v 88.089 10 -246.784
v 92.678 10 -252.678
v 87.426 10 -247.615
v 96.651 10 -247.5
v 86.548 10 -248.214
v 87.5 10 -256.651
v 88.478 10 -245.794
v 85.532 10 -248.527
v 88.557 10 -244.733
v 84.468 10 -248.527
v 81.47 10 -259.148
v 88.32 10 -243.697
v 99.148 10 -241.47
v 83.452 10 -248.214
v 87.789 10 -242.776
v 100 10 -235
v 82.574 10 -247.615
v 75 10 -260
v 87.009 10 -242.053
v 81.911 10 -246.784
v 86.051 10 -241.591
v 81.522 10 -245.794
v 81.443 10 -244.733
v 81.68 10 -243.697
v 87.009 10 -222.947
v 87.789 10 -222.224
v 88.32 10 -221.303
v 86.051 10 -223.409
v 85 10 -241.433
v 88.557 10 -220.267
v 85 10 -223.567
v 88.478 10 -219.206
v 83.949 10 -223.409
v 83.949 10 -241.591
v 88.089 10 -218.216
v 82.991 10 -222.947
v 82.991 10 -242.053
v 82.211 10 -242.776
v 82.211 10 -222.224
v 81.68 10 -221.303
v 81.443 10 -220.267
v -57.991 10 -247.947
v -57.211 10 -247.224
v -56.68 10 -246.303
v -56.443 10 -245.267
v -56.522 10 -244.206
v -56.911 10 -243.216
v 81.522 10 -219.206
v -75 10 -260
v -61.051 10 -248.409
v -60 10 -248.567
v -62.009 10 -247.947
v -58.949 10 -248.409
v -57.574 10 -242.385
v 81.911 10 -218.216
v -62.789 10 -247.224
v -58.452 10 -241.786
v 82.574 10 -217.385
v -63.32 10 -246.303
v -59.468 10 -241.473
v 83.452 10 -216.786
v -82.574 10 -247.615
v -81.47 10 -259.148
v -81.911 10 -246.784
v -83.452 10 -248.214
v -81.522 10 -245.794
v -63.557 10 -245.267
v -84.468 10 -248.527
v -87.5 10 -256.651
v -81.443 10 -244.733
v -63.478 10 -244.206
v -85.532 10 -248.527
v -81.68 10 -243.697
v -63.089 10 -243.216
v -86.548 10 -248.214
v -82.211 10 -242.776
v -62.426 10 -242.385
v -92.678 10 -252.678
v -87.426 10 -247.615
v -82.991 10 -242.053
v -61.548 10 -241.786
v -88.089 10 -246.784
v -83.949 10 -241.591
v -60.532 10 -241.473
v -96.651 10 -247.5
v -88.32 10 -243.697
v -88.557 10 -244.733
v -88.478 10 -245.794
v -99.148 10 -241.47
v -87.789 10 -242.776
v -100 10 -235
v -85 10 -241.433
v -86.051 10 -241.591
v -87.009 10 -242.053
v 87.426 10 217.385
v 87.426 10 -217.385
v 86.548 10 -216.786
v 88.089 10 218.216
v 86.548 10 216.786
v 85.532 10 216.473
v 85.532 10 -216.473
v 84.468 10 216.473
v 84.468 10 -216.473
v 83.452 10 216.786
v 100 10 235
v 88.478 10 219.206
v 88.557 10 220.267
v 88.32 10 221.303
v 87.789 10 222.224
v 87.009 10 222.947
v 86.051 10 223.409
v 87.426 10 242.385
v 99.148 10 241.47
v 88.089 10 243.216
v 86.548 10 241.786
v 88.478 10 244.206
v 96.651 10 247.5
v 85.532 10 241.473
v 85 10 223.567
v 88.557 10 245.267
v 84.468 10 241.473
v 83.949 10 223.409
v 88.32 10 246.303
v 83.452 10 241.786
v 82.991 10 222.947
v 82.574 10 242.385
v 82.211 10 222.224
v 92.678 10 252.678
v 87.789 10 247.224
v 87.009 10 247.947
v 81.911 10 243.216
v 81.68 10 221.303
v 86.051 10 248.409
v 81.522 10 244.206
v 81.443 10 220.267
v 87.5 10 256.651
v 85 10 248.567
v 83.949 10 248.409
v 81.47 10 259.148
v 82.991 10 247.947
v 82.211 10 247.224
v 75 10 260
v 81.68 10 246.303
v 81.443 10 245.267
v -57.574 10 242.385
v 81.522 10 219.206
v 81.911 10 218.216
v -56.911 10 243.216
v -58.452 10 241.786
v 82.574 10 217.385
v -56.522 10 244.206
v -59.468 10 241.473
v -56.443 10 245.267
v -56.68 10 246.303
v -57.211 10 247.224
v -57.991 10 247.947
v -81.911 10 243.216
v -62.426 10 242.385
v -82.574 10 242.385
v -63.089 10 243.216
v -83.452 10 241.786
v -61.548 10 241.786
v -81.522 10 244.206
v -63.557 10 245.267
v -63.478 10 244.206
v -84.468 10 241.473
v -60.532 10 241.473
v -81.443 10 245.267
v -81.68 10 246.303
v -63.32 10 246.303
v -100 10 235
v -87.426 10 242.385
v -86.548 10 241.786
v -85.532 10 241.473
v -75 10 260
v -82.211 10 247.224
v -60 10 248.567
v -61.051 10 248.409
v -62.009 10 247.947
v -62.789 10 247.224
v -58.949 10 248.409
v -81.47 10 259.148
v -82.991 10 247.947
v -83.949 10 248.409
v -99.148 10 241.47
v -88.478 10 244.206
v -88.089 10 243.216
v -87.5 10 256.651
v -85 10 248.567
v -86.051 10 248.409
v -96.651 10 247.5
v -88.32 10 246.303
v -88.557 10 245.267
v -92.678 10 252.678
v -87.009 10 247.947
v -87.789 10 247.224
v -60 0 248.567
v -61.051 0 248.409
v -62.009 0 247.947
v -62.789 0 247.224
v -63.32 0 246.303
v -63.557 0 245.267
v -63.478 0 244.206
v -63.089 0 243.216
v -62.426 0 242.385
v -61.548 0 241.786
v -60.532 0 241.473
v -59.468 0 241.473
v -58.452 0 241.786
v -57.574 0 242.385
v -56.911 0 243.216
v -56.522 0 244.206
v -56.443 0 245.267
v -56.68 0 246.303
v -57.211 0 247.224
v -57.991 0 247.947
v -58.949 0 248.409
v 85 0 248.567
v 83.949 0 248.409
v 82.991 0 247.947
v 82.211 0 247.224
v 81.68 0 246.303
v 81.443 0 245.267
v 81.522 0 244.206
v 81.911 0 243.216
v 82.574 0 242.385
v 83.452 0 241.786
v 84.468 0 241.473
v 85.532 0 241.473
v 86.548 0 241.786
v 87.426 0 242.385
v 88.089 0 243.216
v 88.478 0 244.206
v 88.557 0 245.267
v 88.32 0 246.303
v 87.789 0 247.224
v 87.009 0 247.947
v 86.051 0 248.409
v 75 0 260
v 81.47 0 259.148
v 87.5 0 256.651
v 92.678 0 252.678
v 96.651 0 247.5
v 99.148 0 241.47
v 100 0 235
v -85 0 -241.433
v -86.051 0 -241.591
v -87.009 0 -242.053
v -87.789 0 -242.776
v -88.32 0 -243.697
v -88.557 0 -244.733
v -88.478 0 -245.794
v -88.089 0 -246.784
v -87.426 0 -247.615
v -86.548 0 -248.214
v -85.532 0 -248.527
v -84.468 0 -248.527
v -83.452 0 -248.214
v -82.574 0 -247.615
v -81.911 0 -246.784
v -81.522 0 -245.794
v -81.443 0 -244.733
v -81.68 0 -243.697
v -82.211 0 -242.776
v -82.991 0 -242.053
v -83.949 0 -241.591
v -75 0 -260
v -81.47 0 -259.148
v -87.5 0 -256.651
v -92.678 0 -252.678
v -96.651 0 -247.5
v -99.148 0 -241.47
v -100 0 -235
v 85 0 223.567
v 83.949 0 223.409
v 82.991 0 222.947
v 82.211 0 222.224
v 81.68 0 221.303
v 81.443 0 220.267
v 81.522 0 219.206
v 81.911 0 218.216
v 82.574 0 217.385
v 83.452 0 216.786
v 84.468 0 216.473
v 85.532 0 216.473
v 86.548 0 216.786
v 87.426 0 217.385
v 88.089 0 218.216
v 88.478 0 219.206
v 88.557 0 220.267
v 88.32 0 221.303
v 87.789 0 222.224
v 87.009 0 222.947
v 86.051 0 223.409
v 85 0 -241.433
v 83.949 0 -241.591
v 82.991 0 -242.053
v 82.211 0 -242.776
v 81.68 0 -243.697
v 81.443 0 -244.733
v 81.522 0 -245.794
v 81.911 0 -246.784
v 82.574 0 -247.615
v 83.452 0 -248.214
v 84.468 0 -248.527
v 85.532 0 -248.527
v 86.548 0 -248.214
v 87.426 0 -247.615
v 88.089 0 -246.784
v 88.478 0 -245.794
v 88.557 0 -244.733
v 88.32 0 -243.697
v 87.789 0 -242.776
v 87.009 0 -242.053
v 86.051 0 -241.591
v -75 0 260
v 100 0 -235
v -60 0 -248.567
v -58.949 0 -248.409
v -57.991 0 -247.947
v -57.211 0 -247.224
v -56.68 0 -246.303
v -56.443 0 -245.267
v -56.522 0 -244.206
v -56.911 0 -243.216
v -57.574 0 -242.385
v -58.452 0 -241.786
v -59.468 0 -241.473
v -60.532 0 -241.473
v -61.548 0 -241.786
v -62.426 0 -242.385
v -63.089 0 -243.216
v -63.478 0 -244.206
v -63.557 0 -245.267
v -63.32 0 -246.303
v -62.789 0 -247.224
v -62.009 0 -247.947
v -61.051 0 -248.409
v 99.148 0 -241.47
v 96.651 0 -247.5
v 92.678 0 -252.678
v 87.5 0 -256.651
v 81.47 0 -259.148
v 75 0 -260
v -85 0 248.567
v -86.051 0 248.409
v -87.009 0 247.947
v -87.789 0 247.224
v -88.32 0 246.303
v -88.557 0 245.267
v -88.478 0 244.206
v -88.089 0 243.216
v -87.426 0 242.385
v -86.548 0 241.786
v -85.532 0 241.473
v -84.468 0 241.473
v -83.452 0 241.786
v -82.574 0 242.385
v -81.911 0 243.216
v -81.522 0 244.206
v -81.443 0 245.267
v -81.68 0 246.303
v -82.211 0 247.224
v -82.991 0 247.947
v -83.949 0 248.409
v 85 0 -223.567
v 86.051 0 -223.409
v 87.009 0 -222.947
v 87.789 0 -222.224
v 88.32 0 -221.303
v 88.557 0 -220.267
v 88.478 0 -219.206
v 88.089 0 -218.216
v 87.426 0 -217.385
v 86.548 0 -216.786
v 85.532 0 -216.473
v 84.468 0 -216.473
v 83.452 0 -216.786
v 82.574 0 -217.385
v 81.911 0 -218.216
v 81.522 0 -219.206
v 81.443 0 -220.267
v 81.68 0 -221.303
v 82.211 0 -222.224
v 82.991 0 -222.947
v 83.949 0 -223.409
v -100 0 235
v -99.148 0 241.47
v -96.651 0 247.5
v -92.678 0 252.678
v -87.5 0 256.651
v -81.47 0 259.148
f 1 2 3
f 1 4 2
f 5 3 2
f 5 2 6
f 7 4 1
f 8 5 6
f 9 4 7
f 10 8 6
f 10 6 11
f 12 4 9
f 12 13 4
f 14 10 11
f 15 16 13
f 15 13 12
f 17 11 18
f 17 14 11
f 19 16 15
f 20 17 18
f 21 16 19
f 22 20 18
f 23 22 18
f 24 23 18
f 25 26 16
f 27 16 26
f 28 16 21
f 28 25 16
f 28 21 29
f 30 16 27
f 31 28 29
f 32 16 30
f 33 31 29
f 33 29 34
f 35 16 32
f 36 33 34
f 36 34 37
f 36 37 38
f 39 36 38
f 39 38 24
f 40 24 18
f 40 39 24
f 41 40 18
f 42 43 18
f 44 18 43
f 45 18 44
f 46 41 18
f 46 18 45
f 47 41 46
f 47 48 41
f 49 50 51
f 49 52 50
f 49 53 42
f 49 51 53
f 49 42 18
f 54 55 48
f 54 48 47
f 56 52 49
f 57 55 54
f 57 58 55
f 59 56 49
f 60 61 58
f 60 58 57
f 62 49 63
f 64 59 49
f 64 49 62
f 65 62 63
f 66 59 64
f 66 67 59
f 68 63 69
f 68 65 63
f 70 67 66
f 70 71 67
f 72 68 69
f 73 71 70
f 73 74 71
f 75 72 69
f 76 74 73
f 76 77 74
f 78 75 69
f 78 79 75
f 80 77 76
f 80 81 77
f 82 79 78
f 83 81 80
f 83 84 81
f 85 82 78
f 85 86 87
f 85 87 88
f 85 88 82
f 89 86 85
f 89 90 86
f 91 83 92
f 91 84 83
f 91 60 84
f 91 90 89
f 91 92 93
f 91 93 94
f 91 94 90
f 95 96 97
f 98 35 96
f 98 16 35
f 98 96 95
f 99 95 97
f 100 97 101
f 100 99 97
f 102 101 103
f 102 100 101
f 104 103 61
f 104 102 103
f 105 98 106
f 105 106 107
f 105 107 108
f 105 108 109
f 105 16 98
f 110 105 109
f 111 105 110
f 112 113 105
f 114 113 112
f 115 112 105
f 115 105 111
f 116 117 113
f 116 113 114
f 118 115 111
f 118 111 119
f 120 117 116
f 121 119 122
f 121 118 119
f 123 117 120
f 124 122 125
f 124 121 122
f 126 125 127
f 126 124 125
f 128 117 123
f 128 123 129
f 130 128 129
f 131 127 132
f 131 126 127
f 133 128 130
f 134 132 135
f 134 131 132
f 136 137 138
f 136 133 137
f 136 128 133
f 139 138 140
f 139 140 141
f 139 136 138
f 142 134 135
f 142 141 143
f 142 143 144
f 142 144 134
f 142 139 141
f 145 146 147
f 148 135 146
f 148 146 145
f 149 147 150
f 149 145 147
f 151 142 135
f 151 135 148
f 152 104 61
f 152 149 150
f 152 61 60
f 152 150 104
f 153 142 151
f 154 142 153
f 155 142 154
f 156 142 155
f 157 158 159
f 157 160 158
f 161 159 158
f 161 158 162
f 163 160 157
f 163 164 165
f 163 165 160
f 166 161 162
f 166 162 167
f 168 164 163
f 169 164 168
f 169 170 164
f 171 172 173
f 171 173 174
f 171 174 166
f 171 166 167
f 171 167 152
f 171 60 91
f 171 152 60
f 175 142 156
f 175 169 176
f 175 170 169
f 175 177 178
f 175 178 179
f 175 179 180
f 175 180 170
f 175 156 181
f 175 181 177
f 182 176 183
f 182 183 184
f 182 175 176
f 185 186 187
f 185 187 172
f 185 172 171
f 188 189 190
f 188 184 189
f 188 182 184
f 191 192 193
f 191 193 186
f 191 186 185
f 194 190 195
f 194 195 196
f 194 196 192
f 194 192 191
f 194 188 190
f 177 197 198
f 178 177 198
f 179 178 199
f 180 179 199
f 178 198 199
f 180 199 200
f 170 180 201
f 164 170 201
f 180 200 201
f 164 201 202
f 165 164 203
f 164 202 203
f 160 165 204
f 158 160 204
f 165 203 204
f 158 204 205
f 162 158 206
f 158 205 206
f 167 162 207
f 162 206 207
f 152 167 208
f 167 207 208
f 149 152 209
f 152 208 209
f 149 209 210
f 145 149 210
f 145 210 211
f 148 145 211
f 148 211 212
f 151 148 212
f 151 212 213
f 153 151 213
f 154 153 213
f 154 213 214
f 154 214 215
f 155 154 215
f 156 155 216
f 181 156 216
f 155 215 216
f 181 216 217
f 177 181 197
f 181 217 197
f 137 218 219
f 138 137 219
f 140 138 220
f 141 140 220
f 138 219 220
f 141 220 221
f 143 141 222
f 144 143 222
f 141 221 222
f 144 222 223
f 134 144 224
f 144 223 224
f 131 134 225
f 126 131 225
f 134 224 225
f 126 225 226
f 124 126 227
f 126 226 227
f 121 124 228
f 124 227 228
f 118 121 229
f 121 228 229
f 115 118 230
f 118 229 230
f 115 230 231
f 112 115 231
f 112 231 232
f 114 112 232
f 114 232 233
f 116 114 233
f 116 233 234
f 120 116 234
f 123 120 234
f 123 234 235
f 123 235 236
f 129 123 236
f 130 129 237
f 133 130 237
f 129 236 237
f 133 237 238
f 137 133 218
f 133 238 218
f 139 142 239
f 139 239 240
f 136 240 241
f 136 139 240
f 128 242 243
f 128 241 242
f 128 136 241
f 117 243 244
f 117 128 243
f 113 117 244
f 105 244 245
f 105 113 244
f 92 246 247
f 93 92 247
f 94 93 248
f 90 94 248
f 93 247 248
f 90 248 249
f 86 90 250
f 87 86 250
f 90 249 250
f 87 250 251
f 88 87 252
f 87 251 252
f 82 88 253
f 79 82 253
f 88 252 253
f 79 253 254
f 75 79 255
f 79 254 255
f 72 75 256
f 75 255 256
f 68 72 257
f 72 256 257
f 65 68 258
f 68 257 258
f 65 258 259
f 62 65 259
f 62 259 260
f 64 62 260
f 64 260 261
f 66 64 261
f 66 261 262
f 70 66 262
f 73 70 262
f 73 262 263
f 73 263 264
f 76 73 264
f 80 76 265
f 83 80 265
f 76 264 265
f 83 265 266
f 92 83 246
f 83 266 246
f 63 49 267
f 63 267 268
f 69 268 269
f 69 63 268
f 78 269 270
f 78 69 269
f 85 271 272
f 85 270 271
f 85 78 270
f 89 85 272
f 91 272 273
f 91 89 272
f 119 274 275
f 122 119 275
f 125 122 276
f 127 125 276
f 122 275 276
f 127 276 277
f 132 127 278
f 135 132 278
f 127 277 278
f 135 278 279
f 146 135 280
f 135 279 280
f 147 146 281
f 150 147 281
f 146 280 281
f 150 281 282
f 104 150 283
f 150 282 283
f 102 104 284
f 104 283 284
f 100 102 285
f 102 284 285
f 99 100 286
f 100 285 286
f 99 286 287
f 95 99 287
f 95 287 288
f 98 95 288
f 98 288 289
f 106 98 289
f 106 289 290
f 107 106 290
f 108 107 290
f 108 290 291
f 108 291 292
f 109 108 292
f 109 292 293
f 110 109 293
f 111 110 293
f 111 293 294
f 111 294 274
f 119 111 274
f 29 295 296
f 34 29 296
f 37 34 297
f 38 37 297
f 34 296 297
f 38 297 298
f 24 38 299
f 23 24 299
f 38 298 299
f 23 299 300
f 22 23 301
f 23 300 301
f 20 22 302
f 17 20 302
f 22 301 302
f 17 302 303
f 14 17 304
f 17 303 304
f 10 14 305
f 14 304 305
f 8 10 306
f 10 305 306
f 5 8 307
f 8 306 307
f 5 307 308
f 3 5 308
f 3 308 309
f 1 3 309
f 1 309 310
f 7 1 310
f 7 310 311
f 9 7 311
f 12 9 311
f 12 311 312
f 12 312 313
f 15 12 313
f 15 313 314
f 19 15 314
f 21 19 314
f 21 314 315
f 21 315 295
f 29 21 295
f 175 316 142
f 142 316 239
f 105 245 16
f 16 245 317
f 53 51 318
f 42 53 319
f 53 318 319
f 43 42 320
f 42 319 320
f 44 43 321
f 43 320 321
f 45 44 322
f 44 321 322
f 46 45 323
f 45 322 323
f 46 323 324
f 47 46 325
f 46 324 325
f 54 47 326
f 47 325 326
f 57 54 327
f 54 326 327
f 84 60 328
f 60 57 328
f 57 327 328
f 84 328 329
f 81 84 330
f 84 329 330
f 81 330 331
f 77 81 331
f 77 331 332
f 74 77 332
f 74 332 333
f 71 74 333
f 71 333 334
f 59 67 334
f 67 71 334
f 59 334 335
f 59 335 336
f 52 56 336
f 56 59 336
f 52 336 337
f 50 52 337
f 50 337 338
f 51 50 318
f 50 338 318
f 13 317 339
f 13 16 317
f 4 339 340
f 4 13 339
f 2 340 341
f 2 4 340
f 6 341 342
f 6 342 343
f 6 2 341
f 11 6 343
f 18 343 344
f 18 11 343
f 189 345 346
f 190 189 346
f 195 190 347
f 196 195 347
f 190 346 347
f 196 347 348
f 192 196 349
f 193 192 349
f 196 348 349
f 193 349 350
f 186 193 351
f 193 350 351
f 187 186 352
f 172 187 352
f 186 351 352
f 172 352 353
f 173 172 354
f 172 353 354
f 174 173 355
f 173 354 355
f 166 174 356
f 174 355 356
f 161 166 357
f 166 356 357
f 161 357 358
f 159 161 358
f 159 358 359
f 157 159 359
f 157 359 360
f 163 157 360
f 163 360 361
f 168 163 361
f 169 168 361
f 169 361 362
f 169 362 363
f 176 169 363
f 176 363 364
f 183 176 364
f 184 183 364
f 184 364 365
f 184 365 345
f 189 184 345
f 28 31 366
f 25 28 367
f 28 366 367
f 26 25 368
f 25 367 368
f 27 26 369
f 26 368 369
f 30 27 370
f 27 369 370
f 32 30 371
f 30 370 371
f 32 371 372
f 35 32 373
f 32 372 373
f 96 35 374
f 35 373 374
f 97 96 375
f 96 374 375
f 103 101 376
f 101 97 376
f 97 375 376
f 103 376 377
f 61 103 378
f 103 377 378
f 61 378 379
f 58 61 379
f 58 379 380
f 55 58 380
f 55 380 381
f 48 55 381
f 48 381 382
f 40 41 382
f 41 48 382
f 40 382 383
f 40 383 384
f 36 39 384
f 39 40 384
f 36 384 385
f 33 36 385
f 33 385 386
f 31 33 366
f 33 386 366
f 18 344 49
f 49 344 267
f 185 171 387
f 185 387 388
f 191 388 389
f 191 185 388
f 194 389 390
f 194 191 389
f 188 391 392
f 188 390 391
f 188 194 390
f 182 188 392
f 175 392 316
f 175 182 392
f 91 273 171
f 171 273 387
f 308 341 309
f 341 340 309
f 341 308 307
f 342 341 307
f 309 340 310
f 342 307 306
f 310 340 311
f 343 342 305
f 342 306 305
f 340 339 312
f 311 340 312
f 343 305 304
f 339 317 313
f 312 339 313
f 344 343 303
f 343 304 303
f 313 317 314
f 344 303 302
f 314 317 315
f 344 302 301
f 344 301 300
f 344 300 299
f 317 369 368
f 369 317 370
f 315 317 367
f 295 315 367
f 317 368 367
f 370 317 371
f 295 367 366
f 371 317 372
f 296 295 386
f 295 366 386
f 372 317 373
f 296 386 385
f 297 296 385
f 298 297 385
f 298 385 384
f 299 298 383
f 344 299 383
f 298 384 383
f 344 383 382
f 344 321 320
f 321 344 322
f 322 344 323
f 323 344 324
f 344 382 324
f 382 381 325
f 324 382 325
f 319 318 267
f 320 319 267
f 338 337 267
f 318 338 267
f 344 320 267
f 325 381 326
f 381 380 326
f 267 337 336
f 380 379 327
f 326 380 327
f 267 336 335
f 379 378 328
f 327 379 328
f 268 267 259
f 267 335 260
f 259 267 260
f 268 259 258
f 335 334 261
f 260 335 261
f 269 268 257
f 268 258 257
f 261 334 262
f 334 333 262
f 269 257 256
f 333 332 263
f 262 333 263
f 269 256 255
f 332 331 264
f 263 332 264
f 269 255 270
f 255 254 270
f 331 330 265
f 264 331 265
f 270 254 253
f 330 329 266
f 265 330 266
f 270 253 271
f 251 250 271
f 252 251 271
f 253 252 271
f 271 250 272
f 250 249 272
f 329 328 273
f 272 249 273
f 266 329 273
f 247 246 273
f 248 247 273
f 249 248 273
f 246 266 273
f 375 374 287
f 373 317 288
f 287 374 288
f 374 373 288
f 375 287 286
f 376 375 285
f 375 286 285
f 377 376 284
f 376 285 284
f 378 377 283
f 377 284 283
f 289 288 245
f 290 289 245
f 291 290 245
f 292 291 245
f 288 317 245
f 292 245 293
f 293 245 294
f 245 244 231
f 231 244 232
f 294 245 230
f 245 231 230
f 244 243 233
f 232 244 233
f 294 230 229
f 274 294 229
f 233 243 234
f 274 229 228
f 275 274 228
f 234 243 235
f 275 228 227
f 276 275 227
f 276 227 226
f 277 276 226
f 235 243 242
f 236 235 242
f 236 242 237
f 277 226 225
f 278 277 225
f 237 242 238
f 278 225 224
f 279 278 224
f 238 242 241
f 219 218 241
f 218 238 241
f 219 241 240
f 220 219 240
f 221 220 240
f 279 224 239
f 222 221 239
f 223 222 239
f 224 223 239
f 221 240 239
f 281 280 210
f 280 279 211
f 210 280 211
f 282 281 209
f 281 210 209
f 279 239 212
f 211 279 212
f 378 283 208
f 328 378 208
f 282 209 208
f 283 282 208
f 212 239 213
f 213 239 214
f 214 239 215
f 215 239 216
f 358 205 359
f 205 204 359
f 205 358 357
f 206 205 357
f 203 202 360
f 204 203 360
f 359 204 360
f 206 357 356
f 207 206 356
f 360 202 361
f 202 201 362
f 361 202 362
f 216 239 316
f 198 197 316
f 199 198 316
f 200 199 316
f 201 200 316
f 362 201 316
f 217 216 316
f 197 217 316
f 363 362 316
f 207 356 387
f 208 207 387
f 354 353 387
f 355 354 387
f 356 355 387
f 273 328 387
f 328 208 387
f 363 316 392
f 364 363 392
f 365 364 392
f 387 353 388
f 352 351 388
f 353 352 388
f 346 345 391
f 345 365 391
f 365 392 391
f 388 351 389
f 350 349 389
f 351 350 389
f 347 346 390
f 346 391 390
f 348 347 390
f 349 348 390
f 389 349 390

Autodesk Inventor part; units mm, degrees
ref_plane "YZ Plane" through (0, 0, 0) normal (1, 0, 0) x (0, 1, 0)
ref_plane "XZ Plane" through (0, 0, 0) normal (0, 1, 0) x (-1, 0, 0)
ref_plane "XY Plane" through (0, 0, 0) normal (0, 0, 1) x (1, 0, 0)
sketch "Sketch1" plane through (0, 0, 0) normal (0, 1, 0) x (-1, 0, 0)
  line L0 (-100, -260) -> (100, -260)
  line L1 (100, -260) -> (100, 260)
  line L2 (100, 260) -> (-100, 260)
  line L3 (-100, 260) -> (-100, -260)
  line L4 (-100, -260) -> (100, 260) construction
  line L5 (100, -260) -> (-100, 260) construction
  point P0 (0, 0)
  dimension "d0" = 200
  dimension "d1" = 520
extrude "Extrusion1" add sketch "Sketch1" along normal blind 10
fillet "Fillet1" radius 25 4 edges at (-100, 5, -260) (-100, 5, 260) (100, 5, 260) (100, 5, -260)
sketch "Sketch2" plane through (0, 10, 0) normal (0, 1, 0) x (1, 0, 0)
  line L0 (100, -235) -> (100, 235) projected
  line L1 (-75, -260) -> (75, -260) projected
  point P0 (0, 0)
  point P1 (85, -245)
  dimension "d5" = 15
  dimension "d6" = 15
hole "Hole1" at (85, 10, 245) direction (0, -1, 0) diameter 7.134 end through all thread size "M8x0.8" class "6H" standard "ISO Metric profile"
pattern_linear "Rectangular Pattern1" count 2 spacing 170 along (-1, 0, 0) count 2 spacing 490 along (0, 0, -1) of "Hole1"
sketch "Sketch7" plane through (0, 10, 0) normal (0, 1, 0) x (1, 0, 0)
  circle A0 centre (85, -245) radius 3.567 projected
  line L0 (100, -235) -> (100, 235) projected
  circle A1 centre (-85, -245) radius 3.567 projected
  line L1 (-75, -260) -> (75, -260) projected
  point P0 (0, 0)
  point P1 (85, -220)
  point P2 (-60, -245)
  dimension "d61" = 25
  dimension "d62" = 15
  dimension "d63" = 25
  dimension "d64" = 15
hole "Hole6" at (85, 10, 220) at (-60, 10, 245) direction (0, -1, 0) diameter 7.134 end through all thread size "M8x0.8" class "6H" standard "ISO Metric profile"
mirror "Mirror2" about plane through (0, 0, 0) normal (0, 0, 1) of "Hole6"
properties part number "Mid_plate" material "Stainless Steel"
